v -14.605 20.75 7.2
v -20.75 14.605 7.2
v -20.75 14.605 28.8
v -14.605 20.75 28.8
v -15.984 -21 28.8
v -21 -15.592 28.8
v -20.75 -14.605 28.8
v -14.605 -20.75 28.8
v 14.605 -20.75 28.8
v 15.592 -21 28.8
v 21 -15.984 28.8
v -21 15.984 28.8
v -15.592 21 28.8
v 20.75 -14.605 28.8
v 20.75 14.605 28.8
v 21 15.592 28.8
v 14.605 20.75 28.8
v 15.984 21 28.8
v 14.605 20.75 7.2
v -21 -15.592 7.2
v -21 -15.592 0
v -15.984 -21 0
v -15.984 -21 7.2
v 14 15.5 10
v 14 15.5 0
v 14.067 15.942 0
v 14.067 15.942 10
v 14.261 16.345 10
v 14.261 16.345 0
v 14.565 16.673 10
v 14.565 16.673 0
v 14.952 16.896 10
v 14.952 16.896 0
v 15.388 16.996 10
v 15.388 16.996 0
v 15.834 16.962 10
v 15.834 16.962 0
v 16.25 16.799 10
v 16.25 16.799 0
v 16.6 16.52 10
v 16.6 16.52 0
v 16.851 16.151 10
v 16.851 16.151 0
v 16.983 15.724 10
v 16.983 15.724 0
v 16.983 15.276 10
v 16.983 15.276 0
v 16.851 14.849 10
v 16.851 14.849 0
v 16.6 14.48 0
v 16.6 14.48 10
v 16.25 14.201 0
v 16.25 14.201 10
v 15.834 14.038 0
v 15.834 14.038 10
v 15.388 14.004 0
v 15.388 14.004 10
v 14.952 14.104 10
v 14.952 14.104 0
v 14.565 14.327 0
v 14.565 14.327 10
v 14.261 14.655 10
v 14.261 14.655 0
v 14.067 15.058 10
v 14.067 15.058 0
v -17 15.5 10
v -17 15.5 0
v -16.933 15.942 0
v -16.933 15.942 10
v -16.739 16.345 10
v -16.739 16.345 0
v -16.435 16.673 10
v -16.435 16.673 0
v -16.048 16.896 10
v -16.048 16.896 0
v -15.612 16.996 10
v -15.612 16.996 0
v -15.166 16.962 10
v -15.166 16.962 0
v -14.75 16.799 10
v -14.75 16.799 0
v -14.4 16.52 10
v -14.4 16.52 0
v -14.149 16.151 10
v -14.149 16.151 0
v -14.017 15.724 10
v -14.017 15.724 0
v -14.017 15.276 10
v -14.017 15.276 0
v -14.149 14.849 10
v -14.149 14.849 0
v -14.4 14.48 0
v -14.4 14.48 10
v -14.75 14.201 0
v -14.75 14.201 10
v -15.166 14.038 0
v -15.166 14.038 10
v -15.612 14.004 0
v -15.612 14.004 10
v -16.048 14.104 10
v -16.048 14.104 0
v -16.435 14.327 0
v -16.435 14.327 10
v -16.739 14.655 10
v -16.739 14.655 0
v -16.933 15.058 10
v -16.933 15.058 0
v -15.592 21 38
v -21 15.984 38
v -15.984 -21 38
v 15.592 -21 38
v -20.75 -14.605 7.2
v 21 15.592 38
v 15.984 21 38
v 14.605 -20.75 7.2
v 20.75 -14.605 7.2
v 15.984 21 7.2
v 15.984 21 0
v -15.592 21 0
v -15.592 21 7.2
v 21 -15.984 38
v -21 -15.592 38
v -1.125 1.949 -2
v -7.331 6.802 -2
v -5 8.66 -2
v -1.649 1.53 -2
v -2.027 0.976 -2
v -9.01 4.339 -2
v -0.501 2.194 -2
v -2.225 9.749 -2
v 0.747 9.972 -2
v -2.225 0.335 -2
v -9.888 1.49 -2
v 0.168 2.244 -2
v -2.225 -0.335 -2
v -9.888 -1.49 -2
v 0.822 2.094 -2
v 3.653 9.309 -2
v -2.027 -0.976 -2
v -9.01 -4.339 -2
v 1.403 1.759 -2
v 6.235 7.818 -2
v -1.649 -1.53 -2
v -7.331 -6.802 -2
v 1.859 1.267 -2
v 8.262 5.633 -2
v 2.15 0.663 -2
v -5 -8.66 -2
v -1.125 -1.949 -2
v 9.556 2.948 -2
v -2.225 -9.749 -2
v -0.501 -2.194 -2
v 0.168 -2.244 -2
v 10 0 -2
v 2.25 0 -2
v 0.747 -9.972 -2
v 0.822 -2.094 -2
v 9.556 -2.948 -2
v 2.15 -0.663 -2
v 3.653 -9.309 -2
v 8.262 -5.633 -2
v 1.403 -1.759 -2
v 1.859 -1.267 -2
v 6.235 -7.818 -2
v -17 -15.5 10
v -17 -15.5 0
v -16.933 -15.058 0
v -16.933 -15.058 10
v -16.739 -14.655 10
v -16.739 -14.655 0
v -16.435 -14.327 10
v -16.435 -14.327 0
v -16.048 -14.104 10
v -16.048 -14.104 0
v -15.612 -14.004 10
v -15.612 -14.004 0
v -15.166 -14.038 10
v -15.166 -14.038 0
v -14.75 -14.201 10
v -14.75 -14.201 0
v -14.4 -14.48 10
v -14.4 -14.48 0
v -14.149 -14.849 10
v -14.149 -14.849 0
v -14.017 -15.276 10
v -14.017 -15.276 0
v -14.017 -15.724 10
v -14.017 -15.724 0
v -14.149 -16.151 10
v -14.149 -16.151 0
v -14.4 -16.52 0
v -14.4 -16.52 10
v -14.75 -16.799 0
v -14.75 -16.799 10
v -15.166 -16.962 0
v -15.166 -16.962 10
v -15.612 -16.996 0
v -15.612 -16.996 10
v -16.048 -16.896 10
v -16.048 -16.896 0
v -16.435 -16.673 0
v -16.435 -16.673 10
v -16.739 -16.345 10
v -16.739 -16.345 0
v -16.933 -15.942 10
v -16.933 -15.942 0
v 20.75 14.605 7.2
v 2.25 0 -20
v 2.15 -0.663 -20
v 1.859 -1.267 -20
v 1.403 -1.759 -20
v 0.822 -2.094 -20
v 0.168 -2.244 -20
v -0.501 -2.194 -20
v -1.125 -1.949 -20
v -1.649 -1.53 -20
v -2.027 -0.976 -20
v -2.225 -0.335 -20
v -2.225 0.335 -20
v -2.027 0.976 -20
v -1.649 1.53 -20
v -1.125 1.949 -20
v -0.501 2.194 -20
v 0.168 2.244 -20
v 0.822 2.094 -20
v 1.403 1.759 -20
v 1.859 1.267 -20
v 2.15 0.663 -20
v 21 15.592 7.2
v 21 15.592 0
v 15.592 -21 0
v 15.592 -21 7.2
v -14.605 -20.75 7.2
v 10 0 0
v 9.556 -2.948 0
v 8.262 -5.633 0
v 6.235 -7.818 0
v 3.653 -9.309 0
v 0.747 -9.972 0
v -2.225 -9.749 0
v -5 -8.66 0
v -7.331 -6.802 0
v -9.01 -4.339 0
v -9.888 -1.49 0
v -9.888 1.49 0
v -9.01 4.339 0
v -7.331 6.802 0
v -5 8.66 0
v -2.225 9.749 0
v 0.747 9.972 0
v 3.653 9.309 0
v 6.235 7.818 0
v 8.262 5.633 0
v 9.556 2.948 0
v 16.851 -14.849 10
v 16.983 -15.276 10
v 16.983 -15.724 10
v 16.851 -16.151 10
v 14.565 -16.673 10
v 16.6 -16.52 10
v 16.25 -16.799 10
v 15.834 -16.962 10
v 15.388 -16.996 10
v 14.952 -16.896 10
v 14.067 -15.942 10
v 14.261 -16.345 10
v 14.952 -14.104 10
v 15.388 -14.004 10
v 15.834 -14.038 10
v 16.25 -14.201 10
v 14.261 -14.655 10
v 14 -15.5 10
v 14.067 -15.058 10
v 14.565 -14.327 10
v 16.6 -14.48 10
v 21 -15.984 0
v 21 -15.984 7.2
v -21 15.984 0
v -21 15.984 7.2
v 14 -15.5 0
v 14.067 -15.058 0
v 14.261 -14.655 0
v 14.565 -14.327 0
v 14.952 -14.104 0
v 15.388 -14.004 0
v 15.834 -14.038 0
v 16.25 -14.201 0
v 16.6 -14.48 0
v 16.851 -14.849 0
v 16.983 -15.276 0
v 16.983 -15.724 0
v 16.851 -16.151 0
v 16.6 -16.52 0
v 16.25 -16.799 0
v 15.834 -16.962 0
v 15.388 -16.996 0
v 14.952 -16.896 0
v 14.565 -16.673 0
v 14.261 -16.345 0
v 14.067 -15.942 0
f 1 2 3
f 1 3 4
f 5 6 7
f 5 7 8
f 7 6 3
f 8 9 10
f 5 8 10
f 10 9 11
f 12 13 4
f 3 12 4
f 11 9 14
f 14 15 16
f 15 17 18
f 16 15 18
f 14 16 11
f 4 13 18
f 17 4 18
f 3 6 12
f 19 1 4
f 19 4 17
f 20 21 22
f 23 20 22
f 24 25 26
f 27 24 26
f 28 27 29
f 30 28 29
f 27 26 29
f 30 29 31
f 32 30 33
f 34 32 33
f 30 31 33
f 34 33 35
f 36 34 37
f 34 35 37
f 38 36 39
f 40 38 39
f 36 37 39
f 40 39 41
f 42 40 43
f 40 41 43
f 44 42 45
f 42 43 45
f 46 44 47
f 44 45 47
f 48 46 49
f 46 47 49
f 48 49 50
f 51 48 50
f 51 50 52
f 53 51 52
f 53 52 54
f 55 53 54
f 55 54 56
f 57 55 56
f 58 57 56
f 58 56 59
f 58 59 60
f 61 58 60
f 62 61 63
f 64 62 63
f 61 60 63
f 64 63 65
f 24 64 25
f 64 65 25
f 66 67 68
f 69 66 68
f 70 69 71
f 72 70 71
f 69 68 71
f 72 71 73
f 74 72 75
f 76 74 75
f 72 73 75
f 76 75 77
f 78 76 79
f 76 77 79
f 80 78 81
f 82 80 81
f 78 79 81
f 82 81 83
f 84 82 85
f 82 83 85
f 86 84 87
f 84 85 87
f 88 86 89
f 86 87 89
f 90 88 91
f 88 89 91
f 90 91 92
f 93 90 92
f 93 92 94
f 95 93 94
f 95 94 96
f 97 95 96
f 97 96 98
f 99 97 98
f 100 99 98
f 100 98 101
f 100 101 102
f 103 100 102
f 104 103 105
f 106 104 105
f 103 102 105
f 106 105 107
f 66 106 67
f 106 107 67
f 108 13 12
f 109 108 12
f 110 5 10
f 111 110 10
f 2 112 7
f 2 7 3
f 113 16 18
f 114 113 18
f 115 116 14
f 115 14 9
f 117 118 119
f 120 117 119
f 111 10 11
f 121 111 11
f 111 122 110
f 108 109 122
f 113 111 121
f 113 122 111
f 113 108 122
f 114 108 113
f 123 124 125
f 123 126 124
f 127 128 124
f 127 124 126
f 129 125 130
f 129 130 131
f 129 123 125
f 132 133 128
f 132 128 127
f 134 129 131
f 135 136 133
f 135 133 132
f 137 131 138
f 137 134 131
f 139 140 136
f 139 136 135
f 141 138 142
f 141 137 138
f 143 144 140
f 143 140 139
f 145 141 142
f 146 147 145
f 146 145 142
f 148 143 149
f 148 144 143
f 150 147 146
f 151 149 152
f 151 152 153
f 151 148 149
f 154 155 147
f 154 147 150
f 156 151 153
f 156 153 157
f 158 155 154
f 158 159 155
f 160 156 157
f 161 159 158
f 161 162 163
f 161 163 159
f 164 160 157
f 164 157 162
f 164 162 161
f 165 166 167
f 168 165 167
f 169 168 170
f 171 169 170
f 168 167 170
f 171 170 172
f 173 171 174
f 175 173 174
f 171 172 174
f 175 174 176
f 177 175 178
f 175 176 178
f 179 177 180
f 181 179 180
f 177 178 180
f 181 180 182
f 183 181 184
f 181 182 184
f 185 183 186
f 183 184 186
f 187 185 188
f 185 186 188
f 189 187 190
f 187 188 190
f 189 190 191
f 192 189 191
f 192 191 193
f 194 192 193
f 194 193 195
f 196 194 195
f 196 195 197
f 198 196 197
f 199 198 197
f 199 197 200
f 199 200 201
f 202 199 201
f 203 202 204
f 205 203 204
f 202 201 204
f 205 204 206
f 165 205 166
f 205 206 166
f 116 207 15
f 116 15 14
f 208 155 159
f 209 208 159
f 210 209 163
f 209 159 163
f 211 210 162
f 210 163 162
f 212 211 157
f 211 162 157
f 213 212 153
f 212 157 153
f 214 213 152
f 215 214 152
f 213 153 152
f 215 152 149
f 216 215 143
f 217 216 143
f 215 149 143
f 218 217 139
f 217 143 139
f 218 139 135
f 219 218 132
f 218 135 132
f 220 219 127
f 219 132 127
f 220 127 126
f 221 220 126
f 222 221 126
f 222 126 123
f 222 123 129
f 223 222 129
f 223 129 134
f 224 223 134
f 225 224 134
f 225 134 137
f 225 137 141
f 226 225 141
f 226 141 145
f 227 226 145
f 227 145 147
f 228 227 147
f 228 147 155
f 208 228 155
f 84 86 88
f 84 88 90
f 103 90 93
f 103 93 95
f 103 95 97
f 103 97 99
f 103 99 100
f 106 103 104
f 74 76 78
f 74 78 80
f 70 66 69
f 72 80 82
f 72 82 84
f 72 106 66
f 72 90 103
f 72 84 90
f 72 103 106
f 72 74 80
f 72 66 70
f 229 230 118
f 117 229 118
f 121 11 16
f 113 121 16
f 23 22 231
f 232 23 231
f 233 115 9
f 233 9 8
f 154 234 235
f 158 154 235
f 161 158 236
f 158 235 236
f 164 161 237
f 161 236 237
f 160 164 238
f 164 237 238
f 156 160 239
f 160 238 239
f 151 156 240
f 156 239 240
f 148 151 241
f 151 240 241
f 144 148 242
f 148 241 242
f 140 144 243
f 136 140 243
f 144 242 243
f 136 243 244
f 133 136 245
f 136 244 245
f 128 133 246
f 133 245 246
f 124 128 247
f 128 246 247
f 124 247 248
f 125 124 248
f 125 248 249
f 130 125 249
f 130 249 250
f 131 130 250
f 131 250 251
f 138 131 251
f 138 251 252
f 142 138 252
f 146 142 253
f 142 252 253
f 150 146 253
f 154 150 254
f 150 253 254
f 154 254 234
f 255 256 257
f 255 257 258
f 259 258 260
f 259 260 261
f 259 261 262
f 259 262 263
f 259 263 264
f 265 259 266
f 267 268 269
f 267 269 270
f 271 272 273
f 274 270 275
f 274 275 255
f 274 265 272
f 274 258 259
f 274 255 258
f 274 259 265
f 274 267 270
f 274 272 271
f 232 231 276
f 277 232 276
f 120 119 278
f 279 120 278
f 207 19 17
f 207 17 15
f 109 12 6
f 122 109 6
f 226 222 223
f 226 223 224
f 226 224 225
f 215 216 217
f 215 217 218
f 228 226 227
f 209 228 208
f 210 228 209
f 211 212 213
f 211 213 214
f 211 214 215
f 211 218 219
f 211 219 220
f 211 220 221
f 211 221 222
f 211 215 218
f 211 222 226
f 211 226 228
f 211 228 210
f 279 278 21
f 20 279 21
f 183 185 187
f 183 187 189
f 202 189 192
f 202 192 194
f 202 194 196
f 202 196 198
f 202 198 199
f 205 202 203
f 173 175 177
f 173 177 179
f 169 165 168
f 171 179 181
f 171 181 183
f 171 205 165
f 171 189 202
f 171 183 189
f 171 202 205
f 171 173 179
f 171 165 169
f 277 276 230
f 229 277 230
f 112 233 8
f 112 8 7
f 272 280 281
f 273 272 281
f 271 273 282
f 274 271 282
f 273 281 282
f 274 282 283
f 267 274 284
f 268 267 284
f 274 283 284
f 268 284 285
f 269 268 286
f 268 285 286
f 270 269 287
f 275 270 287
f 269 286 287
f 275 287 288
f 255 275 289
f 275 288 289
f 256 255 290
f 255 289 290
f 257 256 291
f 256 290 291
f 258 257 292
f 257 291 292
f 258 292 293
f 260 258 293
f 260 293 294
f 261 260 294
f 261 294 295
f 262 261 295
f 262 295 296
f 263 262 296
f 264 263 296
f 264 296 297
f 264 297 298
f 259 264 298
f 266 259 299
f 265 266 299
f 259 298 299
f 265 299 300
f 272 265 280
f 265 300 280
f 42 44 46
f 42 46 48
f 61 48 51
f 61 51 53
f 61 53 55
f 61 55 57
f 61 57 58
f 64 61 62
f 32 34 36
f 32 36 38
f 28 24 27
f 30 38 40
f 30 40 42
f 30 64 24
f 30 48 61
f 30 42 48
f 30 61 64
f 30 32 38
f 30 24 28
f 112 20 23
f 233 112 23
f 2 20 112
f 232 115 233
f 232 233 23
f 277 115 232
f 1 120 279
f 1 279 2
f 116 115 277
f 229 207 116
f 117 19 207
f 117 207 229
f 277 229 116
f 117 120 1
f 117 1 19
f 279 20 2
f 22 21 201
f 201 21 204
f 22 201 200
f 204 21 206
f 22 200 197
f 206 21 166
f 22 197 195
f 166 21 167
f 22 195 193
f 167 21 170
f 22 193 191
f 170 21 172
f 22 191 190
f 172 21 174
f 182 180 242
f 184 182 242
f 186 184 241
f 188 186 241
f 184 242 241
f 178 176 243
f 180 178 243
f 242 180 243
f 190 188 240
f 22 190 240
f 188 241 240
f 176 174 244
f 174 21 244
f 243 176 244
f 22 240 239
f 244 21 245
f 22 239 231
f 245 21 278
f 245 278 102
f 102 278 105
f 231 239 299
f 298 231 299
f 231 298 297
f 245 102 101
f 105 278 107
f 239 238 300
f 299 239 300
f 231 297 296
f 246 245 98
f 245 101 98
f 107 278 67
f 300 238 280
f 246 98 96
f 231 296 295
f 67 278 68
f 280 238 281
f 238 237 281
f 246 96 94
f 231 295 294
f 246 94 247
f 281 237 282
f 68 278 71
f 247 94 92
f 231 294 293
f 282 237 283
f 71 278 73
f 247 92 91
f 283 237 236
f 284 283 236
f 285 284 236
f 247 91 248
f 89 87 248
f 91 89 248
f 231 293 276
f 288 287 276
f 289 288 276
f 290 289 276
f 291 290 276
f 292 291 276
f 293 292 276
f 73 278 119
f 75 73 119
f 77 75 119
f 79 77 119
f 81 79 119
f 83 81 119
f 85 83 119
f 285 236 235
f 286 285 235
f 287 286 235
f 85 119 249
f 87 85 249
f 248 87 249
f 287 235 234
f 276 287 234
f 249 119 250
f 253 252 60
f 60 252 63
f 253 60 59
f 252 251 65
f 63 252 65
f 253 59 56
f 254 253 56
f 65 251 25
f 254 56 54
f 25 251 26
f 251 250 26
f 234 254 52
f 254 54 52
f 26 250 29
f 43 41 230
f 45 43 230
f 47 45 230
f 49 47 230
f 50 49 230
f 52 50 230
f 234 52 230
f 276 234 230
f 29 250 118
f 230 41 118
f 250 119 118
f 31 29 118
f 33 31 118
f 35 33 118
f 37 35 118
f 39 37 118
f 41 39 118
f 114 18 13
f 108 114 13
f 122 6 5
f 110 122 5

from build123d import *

# Parameters (mm, degrees)
RESSALTO_EXTRUS_O1_DEPTH   = 38
CORTE_EXTRUS_O_FINA1_START = -30.8
CORTE_EXTRUS_O_FINA1_DEPTH = 21.6
ESBO_O3_R                  = 2.25
RESSALTO_EXTRUS_O2_DEPTH   = 20
ESBO_O4_R                  = 10
RESSALTO_EXTRUS_O3_DEPTH   = 2
ESBO_O5_R                  = 1.5
CORTE_EXTRUS_O1_DEPTH      = 10


# Read off the part's stored shape, not the designer's step: Corte-Extrusão-Fina1
with BuildPart() as part:
    # Esboço1 → Ressalto-extrusão1 (new body)
    with BuildSketch(Plane.XY):
        Polygon((-21, -15.592171873), (-15.984175996, -21), (15.592171873, -21), (21, -15.984175996), (21, 15.592171873), (15.984175996, 21), (-15.592171873, 21), (-21, 15.984175996), align=None)
    extrude(amount=RESSALTO_EXTRUS_O1_DEPTH)

    # Corte-Extrusão-Fina1 outline → Corte-Extrusão-Fina1 (cut)
    with BuildSketch(Plane.XY.offset(38).offset(CORTE_EXTRUS_O_FINA1_START)):
        Polygon((15.592171873, -21), (21, -15.984175996), (21, 15.592171873), (15.984175996, 21), (-15.592171873, 21), (-21, 15.984175996), (-21, -15.592171873), (-15.984175996, -21), align=None)
        Polygon((14.605339059, 20.75), (20.75, 14.605339059), (20.75, -14.605339059), (14.605339059, -20.75), (-14.605339059, -20.75), (-20.75, -14.605339059), (-20.75, 14.605339059), (-14.605339059, 20.75), align=None, mode=Mode.SUBTRACT)
    extrude(amount=CORTE_EXTRUS_O_FINA1_DEPTH, mode=Mode.SUBTRACT)

    # Esboço3 → Ressalto-extrusão2 (add)
    with BuildSketch(Plane(origin=(0, 0, 0), x_dir=(-1, 0, 0), z_dir=(0, 0, -1))):
        with Locations(Location((0, 0, 0), (0, 0, 180))):
            Circle(ESBO_O3_R)
    extrude(amount=RESSALTO_EXTRUS_O2_DEPTH)

    # Esboço4 → Ressalto-extrusão3 (add)
    with BuildSketch(Plane(origin=(0, 0, 0), x_dir=(-1, 0, 0), z_dir=(0, 0, -1))):
        with Locations(Location((0, 0, 0), (0, 0, 180))):
            Circle(ESBO_O4_R)
    extrude(amount=RESSALTO_EXTRUS_O3_DEPTH)

    # Esboço5 → Corte-extrusão1 (cut)
    with BuildSketch(Plane(origin=(0, 0, 0), x_dir=(-1, 0, 0), z_dir=(0, 0, -1))):
        with Locations((15.5, -15.5)):
            Circle(ESBO_O5_R)
        with Locations((-15.5, -15.5)):
            Circle(ESBO_O5_R)
        with Locations((-15.5, 15.5)):
            Circle(ESBO_O5_R)
        with Locations((15.5, 15.5)):
            Circle(ESBO_O5_R)
    extrude(amount=-CORTE_EXTRUS_O1_DEPTH, mode=Mode.SUBTRACT)


solid = part.part
